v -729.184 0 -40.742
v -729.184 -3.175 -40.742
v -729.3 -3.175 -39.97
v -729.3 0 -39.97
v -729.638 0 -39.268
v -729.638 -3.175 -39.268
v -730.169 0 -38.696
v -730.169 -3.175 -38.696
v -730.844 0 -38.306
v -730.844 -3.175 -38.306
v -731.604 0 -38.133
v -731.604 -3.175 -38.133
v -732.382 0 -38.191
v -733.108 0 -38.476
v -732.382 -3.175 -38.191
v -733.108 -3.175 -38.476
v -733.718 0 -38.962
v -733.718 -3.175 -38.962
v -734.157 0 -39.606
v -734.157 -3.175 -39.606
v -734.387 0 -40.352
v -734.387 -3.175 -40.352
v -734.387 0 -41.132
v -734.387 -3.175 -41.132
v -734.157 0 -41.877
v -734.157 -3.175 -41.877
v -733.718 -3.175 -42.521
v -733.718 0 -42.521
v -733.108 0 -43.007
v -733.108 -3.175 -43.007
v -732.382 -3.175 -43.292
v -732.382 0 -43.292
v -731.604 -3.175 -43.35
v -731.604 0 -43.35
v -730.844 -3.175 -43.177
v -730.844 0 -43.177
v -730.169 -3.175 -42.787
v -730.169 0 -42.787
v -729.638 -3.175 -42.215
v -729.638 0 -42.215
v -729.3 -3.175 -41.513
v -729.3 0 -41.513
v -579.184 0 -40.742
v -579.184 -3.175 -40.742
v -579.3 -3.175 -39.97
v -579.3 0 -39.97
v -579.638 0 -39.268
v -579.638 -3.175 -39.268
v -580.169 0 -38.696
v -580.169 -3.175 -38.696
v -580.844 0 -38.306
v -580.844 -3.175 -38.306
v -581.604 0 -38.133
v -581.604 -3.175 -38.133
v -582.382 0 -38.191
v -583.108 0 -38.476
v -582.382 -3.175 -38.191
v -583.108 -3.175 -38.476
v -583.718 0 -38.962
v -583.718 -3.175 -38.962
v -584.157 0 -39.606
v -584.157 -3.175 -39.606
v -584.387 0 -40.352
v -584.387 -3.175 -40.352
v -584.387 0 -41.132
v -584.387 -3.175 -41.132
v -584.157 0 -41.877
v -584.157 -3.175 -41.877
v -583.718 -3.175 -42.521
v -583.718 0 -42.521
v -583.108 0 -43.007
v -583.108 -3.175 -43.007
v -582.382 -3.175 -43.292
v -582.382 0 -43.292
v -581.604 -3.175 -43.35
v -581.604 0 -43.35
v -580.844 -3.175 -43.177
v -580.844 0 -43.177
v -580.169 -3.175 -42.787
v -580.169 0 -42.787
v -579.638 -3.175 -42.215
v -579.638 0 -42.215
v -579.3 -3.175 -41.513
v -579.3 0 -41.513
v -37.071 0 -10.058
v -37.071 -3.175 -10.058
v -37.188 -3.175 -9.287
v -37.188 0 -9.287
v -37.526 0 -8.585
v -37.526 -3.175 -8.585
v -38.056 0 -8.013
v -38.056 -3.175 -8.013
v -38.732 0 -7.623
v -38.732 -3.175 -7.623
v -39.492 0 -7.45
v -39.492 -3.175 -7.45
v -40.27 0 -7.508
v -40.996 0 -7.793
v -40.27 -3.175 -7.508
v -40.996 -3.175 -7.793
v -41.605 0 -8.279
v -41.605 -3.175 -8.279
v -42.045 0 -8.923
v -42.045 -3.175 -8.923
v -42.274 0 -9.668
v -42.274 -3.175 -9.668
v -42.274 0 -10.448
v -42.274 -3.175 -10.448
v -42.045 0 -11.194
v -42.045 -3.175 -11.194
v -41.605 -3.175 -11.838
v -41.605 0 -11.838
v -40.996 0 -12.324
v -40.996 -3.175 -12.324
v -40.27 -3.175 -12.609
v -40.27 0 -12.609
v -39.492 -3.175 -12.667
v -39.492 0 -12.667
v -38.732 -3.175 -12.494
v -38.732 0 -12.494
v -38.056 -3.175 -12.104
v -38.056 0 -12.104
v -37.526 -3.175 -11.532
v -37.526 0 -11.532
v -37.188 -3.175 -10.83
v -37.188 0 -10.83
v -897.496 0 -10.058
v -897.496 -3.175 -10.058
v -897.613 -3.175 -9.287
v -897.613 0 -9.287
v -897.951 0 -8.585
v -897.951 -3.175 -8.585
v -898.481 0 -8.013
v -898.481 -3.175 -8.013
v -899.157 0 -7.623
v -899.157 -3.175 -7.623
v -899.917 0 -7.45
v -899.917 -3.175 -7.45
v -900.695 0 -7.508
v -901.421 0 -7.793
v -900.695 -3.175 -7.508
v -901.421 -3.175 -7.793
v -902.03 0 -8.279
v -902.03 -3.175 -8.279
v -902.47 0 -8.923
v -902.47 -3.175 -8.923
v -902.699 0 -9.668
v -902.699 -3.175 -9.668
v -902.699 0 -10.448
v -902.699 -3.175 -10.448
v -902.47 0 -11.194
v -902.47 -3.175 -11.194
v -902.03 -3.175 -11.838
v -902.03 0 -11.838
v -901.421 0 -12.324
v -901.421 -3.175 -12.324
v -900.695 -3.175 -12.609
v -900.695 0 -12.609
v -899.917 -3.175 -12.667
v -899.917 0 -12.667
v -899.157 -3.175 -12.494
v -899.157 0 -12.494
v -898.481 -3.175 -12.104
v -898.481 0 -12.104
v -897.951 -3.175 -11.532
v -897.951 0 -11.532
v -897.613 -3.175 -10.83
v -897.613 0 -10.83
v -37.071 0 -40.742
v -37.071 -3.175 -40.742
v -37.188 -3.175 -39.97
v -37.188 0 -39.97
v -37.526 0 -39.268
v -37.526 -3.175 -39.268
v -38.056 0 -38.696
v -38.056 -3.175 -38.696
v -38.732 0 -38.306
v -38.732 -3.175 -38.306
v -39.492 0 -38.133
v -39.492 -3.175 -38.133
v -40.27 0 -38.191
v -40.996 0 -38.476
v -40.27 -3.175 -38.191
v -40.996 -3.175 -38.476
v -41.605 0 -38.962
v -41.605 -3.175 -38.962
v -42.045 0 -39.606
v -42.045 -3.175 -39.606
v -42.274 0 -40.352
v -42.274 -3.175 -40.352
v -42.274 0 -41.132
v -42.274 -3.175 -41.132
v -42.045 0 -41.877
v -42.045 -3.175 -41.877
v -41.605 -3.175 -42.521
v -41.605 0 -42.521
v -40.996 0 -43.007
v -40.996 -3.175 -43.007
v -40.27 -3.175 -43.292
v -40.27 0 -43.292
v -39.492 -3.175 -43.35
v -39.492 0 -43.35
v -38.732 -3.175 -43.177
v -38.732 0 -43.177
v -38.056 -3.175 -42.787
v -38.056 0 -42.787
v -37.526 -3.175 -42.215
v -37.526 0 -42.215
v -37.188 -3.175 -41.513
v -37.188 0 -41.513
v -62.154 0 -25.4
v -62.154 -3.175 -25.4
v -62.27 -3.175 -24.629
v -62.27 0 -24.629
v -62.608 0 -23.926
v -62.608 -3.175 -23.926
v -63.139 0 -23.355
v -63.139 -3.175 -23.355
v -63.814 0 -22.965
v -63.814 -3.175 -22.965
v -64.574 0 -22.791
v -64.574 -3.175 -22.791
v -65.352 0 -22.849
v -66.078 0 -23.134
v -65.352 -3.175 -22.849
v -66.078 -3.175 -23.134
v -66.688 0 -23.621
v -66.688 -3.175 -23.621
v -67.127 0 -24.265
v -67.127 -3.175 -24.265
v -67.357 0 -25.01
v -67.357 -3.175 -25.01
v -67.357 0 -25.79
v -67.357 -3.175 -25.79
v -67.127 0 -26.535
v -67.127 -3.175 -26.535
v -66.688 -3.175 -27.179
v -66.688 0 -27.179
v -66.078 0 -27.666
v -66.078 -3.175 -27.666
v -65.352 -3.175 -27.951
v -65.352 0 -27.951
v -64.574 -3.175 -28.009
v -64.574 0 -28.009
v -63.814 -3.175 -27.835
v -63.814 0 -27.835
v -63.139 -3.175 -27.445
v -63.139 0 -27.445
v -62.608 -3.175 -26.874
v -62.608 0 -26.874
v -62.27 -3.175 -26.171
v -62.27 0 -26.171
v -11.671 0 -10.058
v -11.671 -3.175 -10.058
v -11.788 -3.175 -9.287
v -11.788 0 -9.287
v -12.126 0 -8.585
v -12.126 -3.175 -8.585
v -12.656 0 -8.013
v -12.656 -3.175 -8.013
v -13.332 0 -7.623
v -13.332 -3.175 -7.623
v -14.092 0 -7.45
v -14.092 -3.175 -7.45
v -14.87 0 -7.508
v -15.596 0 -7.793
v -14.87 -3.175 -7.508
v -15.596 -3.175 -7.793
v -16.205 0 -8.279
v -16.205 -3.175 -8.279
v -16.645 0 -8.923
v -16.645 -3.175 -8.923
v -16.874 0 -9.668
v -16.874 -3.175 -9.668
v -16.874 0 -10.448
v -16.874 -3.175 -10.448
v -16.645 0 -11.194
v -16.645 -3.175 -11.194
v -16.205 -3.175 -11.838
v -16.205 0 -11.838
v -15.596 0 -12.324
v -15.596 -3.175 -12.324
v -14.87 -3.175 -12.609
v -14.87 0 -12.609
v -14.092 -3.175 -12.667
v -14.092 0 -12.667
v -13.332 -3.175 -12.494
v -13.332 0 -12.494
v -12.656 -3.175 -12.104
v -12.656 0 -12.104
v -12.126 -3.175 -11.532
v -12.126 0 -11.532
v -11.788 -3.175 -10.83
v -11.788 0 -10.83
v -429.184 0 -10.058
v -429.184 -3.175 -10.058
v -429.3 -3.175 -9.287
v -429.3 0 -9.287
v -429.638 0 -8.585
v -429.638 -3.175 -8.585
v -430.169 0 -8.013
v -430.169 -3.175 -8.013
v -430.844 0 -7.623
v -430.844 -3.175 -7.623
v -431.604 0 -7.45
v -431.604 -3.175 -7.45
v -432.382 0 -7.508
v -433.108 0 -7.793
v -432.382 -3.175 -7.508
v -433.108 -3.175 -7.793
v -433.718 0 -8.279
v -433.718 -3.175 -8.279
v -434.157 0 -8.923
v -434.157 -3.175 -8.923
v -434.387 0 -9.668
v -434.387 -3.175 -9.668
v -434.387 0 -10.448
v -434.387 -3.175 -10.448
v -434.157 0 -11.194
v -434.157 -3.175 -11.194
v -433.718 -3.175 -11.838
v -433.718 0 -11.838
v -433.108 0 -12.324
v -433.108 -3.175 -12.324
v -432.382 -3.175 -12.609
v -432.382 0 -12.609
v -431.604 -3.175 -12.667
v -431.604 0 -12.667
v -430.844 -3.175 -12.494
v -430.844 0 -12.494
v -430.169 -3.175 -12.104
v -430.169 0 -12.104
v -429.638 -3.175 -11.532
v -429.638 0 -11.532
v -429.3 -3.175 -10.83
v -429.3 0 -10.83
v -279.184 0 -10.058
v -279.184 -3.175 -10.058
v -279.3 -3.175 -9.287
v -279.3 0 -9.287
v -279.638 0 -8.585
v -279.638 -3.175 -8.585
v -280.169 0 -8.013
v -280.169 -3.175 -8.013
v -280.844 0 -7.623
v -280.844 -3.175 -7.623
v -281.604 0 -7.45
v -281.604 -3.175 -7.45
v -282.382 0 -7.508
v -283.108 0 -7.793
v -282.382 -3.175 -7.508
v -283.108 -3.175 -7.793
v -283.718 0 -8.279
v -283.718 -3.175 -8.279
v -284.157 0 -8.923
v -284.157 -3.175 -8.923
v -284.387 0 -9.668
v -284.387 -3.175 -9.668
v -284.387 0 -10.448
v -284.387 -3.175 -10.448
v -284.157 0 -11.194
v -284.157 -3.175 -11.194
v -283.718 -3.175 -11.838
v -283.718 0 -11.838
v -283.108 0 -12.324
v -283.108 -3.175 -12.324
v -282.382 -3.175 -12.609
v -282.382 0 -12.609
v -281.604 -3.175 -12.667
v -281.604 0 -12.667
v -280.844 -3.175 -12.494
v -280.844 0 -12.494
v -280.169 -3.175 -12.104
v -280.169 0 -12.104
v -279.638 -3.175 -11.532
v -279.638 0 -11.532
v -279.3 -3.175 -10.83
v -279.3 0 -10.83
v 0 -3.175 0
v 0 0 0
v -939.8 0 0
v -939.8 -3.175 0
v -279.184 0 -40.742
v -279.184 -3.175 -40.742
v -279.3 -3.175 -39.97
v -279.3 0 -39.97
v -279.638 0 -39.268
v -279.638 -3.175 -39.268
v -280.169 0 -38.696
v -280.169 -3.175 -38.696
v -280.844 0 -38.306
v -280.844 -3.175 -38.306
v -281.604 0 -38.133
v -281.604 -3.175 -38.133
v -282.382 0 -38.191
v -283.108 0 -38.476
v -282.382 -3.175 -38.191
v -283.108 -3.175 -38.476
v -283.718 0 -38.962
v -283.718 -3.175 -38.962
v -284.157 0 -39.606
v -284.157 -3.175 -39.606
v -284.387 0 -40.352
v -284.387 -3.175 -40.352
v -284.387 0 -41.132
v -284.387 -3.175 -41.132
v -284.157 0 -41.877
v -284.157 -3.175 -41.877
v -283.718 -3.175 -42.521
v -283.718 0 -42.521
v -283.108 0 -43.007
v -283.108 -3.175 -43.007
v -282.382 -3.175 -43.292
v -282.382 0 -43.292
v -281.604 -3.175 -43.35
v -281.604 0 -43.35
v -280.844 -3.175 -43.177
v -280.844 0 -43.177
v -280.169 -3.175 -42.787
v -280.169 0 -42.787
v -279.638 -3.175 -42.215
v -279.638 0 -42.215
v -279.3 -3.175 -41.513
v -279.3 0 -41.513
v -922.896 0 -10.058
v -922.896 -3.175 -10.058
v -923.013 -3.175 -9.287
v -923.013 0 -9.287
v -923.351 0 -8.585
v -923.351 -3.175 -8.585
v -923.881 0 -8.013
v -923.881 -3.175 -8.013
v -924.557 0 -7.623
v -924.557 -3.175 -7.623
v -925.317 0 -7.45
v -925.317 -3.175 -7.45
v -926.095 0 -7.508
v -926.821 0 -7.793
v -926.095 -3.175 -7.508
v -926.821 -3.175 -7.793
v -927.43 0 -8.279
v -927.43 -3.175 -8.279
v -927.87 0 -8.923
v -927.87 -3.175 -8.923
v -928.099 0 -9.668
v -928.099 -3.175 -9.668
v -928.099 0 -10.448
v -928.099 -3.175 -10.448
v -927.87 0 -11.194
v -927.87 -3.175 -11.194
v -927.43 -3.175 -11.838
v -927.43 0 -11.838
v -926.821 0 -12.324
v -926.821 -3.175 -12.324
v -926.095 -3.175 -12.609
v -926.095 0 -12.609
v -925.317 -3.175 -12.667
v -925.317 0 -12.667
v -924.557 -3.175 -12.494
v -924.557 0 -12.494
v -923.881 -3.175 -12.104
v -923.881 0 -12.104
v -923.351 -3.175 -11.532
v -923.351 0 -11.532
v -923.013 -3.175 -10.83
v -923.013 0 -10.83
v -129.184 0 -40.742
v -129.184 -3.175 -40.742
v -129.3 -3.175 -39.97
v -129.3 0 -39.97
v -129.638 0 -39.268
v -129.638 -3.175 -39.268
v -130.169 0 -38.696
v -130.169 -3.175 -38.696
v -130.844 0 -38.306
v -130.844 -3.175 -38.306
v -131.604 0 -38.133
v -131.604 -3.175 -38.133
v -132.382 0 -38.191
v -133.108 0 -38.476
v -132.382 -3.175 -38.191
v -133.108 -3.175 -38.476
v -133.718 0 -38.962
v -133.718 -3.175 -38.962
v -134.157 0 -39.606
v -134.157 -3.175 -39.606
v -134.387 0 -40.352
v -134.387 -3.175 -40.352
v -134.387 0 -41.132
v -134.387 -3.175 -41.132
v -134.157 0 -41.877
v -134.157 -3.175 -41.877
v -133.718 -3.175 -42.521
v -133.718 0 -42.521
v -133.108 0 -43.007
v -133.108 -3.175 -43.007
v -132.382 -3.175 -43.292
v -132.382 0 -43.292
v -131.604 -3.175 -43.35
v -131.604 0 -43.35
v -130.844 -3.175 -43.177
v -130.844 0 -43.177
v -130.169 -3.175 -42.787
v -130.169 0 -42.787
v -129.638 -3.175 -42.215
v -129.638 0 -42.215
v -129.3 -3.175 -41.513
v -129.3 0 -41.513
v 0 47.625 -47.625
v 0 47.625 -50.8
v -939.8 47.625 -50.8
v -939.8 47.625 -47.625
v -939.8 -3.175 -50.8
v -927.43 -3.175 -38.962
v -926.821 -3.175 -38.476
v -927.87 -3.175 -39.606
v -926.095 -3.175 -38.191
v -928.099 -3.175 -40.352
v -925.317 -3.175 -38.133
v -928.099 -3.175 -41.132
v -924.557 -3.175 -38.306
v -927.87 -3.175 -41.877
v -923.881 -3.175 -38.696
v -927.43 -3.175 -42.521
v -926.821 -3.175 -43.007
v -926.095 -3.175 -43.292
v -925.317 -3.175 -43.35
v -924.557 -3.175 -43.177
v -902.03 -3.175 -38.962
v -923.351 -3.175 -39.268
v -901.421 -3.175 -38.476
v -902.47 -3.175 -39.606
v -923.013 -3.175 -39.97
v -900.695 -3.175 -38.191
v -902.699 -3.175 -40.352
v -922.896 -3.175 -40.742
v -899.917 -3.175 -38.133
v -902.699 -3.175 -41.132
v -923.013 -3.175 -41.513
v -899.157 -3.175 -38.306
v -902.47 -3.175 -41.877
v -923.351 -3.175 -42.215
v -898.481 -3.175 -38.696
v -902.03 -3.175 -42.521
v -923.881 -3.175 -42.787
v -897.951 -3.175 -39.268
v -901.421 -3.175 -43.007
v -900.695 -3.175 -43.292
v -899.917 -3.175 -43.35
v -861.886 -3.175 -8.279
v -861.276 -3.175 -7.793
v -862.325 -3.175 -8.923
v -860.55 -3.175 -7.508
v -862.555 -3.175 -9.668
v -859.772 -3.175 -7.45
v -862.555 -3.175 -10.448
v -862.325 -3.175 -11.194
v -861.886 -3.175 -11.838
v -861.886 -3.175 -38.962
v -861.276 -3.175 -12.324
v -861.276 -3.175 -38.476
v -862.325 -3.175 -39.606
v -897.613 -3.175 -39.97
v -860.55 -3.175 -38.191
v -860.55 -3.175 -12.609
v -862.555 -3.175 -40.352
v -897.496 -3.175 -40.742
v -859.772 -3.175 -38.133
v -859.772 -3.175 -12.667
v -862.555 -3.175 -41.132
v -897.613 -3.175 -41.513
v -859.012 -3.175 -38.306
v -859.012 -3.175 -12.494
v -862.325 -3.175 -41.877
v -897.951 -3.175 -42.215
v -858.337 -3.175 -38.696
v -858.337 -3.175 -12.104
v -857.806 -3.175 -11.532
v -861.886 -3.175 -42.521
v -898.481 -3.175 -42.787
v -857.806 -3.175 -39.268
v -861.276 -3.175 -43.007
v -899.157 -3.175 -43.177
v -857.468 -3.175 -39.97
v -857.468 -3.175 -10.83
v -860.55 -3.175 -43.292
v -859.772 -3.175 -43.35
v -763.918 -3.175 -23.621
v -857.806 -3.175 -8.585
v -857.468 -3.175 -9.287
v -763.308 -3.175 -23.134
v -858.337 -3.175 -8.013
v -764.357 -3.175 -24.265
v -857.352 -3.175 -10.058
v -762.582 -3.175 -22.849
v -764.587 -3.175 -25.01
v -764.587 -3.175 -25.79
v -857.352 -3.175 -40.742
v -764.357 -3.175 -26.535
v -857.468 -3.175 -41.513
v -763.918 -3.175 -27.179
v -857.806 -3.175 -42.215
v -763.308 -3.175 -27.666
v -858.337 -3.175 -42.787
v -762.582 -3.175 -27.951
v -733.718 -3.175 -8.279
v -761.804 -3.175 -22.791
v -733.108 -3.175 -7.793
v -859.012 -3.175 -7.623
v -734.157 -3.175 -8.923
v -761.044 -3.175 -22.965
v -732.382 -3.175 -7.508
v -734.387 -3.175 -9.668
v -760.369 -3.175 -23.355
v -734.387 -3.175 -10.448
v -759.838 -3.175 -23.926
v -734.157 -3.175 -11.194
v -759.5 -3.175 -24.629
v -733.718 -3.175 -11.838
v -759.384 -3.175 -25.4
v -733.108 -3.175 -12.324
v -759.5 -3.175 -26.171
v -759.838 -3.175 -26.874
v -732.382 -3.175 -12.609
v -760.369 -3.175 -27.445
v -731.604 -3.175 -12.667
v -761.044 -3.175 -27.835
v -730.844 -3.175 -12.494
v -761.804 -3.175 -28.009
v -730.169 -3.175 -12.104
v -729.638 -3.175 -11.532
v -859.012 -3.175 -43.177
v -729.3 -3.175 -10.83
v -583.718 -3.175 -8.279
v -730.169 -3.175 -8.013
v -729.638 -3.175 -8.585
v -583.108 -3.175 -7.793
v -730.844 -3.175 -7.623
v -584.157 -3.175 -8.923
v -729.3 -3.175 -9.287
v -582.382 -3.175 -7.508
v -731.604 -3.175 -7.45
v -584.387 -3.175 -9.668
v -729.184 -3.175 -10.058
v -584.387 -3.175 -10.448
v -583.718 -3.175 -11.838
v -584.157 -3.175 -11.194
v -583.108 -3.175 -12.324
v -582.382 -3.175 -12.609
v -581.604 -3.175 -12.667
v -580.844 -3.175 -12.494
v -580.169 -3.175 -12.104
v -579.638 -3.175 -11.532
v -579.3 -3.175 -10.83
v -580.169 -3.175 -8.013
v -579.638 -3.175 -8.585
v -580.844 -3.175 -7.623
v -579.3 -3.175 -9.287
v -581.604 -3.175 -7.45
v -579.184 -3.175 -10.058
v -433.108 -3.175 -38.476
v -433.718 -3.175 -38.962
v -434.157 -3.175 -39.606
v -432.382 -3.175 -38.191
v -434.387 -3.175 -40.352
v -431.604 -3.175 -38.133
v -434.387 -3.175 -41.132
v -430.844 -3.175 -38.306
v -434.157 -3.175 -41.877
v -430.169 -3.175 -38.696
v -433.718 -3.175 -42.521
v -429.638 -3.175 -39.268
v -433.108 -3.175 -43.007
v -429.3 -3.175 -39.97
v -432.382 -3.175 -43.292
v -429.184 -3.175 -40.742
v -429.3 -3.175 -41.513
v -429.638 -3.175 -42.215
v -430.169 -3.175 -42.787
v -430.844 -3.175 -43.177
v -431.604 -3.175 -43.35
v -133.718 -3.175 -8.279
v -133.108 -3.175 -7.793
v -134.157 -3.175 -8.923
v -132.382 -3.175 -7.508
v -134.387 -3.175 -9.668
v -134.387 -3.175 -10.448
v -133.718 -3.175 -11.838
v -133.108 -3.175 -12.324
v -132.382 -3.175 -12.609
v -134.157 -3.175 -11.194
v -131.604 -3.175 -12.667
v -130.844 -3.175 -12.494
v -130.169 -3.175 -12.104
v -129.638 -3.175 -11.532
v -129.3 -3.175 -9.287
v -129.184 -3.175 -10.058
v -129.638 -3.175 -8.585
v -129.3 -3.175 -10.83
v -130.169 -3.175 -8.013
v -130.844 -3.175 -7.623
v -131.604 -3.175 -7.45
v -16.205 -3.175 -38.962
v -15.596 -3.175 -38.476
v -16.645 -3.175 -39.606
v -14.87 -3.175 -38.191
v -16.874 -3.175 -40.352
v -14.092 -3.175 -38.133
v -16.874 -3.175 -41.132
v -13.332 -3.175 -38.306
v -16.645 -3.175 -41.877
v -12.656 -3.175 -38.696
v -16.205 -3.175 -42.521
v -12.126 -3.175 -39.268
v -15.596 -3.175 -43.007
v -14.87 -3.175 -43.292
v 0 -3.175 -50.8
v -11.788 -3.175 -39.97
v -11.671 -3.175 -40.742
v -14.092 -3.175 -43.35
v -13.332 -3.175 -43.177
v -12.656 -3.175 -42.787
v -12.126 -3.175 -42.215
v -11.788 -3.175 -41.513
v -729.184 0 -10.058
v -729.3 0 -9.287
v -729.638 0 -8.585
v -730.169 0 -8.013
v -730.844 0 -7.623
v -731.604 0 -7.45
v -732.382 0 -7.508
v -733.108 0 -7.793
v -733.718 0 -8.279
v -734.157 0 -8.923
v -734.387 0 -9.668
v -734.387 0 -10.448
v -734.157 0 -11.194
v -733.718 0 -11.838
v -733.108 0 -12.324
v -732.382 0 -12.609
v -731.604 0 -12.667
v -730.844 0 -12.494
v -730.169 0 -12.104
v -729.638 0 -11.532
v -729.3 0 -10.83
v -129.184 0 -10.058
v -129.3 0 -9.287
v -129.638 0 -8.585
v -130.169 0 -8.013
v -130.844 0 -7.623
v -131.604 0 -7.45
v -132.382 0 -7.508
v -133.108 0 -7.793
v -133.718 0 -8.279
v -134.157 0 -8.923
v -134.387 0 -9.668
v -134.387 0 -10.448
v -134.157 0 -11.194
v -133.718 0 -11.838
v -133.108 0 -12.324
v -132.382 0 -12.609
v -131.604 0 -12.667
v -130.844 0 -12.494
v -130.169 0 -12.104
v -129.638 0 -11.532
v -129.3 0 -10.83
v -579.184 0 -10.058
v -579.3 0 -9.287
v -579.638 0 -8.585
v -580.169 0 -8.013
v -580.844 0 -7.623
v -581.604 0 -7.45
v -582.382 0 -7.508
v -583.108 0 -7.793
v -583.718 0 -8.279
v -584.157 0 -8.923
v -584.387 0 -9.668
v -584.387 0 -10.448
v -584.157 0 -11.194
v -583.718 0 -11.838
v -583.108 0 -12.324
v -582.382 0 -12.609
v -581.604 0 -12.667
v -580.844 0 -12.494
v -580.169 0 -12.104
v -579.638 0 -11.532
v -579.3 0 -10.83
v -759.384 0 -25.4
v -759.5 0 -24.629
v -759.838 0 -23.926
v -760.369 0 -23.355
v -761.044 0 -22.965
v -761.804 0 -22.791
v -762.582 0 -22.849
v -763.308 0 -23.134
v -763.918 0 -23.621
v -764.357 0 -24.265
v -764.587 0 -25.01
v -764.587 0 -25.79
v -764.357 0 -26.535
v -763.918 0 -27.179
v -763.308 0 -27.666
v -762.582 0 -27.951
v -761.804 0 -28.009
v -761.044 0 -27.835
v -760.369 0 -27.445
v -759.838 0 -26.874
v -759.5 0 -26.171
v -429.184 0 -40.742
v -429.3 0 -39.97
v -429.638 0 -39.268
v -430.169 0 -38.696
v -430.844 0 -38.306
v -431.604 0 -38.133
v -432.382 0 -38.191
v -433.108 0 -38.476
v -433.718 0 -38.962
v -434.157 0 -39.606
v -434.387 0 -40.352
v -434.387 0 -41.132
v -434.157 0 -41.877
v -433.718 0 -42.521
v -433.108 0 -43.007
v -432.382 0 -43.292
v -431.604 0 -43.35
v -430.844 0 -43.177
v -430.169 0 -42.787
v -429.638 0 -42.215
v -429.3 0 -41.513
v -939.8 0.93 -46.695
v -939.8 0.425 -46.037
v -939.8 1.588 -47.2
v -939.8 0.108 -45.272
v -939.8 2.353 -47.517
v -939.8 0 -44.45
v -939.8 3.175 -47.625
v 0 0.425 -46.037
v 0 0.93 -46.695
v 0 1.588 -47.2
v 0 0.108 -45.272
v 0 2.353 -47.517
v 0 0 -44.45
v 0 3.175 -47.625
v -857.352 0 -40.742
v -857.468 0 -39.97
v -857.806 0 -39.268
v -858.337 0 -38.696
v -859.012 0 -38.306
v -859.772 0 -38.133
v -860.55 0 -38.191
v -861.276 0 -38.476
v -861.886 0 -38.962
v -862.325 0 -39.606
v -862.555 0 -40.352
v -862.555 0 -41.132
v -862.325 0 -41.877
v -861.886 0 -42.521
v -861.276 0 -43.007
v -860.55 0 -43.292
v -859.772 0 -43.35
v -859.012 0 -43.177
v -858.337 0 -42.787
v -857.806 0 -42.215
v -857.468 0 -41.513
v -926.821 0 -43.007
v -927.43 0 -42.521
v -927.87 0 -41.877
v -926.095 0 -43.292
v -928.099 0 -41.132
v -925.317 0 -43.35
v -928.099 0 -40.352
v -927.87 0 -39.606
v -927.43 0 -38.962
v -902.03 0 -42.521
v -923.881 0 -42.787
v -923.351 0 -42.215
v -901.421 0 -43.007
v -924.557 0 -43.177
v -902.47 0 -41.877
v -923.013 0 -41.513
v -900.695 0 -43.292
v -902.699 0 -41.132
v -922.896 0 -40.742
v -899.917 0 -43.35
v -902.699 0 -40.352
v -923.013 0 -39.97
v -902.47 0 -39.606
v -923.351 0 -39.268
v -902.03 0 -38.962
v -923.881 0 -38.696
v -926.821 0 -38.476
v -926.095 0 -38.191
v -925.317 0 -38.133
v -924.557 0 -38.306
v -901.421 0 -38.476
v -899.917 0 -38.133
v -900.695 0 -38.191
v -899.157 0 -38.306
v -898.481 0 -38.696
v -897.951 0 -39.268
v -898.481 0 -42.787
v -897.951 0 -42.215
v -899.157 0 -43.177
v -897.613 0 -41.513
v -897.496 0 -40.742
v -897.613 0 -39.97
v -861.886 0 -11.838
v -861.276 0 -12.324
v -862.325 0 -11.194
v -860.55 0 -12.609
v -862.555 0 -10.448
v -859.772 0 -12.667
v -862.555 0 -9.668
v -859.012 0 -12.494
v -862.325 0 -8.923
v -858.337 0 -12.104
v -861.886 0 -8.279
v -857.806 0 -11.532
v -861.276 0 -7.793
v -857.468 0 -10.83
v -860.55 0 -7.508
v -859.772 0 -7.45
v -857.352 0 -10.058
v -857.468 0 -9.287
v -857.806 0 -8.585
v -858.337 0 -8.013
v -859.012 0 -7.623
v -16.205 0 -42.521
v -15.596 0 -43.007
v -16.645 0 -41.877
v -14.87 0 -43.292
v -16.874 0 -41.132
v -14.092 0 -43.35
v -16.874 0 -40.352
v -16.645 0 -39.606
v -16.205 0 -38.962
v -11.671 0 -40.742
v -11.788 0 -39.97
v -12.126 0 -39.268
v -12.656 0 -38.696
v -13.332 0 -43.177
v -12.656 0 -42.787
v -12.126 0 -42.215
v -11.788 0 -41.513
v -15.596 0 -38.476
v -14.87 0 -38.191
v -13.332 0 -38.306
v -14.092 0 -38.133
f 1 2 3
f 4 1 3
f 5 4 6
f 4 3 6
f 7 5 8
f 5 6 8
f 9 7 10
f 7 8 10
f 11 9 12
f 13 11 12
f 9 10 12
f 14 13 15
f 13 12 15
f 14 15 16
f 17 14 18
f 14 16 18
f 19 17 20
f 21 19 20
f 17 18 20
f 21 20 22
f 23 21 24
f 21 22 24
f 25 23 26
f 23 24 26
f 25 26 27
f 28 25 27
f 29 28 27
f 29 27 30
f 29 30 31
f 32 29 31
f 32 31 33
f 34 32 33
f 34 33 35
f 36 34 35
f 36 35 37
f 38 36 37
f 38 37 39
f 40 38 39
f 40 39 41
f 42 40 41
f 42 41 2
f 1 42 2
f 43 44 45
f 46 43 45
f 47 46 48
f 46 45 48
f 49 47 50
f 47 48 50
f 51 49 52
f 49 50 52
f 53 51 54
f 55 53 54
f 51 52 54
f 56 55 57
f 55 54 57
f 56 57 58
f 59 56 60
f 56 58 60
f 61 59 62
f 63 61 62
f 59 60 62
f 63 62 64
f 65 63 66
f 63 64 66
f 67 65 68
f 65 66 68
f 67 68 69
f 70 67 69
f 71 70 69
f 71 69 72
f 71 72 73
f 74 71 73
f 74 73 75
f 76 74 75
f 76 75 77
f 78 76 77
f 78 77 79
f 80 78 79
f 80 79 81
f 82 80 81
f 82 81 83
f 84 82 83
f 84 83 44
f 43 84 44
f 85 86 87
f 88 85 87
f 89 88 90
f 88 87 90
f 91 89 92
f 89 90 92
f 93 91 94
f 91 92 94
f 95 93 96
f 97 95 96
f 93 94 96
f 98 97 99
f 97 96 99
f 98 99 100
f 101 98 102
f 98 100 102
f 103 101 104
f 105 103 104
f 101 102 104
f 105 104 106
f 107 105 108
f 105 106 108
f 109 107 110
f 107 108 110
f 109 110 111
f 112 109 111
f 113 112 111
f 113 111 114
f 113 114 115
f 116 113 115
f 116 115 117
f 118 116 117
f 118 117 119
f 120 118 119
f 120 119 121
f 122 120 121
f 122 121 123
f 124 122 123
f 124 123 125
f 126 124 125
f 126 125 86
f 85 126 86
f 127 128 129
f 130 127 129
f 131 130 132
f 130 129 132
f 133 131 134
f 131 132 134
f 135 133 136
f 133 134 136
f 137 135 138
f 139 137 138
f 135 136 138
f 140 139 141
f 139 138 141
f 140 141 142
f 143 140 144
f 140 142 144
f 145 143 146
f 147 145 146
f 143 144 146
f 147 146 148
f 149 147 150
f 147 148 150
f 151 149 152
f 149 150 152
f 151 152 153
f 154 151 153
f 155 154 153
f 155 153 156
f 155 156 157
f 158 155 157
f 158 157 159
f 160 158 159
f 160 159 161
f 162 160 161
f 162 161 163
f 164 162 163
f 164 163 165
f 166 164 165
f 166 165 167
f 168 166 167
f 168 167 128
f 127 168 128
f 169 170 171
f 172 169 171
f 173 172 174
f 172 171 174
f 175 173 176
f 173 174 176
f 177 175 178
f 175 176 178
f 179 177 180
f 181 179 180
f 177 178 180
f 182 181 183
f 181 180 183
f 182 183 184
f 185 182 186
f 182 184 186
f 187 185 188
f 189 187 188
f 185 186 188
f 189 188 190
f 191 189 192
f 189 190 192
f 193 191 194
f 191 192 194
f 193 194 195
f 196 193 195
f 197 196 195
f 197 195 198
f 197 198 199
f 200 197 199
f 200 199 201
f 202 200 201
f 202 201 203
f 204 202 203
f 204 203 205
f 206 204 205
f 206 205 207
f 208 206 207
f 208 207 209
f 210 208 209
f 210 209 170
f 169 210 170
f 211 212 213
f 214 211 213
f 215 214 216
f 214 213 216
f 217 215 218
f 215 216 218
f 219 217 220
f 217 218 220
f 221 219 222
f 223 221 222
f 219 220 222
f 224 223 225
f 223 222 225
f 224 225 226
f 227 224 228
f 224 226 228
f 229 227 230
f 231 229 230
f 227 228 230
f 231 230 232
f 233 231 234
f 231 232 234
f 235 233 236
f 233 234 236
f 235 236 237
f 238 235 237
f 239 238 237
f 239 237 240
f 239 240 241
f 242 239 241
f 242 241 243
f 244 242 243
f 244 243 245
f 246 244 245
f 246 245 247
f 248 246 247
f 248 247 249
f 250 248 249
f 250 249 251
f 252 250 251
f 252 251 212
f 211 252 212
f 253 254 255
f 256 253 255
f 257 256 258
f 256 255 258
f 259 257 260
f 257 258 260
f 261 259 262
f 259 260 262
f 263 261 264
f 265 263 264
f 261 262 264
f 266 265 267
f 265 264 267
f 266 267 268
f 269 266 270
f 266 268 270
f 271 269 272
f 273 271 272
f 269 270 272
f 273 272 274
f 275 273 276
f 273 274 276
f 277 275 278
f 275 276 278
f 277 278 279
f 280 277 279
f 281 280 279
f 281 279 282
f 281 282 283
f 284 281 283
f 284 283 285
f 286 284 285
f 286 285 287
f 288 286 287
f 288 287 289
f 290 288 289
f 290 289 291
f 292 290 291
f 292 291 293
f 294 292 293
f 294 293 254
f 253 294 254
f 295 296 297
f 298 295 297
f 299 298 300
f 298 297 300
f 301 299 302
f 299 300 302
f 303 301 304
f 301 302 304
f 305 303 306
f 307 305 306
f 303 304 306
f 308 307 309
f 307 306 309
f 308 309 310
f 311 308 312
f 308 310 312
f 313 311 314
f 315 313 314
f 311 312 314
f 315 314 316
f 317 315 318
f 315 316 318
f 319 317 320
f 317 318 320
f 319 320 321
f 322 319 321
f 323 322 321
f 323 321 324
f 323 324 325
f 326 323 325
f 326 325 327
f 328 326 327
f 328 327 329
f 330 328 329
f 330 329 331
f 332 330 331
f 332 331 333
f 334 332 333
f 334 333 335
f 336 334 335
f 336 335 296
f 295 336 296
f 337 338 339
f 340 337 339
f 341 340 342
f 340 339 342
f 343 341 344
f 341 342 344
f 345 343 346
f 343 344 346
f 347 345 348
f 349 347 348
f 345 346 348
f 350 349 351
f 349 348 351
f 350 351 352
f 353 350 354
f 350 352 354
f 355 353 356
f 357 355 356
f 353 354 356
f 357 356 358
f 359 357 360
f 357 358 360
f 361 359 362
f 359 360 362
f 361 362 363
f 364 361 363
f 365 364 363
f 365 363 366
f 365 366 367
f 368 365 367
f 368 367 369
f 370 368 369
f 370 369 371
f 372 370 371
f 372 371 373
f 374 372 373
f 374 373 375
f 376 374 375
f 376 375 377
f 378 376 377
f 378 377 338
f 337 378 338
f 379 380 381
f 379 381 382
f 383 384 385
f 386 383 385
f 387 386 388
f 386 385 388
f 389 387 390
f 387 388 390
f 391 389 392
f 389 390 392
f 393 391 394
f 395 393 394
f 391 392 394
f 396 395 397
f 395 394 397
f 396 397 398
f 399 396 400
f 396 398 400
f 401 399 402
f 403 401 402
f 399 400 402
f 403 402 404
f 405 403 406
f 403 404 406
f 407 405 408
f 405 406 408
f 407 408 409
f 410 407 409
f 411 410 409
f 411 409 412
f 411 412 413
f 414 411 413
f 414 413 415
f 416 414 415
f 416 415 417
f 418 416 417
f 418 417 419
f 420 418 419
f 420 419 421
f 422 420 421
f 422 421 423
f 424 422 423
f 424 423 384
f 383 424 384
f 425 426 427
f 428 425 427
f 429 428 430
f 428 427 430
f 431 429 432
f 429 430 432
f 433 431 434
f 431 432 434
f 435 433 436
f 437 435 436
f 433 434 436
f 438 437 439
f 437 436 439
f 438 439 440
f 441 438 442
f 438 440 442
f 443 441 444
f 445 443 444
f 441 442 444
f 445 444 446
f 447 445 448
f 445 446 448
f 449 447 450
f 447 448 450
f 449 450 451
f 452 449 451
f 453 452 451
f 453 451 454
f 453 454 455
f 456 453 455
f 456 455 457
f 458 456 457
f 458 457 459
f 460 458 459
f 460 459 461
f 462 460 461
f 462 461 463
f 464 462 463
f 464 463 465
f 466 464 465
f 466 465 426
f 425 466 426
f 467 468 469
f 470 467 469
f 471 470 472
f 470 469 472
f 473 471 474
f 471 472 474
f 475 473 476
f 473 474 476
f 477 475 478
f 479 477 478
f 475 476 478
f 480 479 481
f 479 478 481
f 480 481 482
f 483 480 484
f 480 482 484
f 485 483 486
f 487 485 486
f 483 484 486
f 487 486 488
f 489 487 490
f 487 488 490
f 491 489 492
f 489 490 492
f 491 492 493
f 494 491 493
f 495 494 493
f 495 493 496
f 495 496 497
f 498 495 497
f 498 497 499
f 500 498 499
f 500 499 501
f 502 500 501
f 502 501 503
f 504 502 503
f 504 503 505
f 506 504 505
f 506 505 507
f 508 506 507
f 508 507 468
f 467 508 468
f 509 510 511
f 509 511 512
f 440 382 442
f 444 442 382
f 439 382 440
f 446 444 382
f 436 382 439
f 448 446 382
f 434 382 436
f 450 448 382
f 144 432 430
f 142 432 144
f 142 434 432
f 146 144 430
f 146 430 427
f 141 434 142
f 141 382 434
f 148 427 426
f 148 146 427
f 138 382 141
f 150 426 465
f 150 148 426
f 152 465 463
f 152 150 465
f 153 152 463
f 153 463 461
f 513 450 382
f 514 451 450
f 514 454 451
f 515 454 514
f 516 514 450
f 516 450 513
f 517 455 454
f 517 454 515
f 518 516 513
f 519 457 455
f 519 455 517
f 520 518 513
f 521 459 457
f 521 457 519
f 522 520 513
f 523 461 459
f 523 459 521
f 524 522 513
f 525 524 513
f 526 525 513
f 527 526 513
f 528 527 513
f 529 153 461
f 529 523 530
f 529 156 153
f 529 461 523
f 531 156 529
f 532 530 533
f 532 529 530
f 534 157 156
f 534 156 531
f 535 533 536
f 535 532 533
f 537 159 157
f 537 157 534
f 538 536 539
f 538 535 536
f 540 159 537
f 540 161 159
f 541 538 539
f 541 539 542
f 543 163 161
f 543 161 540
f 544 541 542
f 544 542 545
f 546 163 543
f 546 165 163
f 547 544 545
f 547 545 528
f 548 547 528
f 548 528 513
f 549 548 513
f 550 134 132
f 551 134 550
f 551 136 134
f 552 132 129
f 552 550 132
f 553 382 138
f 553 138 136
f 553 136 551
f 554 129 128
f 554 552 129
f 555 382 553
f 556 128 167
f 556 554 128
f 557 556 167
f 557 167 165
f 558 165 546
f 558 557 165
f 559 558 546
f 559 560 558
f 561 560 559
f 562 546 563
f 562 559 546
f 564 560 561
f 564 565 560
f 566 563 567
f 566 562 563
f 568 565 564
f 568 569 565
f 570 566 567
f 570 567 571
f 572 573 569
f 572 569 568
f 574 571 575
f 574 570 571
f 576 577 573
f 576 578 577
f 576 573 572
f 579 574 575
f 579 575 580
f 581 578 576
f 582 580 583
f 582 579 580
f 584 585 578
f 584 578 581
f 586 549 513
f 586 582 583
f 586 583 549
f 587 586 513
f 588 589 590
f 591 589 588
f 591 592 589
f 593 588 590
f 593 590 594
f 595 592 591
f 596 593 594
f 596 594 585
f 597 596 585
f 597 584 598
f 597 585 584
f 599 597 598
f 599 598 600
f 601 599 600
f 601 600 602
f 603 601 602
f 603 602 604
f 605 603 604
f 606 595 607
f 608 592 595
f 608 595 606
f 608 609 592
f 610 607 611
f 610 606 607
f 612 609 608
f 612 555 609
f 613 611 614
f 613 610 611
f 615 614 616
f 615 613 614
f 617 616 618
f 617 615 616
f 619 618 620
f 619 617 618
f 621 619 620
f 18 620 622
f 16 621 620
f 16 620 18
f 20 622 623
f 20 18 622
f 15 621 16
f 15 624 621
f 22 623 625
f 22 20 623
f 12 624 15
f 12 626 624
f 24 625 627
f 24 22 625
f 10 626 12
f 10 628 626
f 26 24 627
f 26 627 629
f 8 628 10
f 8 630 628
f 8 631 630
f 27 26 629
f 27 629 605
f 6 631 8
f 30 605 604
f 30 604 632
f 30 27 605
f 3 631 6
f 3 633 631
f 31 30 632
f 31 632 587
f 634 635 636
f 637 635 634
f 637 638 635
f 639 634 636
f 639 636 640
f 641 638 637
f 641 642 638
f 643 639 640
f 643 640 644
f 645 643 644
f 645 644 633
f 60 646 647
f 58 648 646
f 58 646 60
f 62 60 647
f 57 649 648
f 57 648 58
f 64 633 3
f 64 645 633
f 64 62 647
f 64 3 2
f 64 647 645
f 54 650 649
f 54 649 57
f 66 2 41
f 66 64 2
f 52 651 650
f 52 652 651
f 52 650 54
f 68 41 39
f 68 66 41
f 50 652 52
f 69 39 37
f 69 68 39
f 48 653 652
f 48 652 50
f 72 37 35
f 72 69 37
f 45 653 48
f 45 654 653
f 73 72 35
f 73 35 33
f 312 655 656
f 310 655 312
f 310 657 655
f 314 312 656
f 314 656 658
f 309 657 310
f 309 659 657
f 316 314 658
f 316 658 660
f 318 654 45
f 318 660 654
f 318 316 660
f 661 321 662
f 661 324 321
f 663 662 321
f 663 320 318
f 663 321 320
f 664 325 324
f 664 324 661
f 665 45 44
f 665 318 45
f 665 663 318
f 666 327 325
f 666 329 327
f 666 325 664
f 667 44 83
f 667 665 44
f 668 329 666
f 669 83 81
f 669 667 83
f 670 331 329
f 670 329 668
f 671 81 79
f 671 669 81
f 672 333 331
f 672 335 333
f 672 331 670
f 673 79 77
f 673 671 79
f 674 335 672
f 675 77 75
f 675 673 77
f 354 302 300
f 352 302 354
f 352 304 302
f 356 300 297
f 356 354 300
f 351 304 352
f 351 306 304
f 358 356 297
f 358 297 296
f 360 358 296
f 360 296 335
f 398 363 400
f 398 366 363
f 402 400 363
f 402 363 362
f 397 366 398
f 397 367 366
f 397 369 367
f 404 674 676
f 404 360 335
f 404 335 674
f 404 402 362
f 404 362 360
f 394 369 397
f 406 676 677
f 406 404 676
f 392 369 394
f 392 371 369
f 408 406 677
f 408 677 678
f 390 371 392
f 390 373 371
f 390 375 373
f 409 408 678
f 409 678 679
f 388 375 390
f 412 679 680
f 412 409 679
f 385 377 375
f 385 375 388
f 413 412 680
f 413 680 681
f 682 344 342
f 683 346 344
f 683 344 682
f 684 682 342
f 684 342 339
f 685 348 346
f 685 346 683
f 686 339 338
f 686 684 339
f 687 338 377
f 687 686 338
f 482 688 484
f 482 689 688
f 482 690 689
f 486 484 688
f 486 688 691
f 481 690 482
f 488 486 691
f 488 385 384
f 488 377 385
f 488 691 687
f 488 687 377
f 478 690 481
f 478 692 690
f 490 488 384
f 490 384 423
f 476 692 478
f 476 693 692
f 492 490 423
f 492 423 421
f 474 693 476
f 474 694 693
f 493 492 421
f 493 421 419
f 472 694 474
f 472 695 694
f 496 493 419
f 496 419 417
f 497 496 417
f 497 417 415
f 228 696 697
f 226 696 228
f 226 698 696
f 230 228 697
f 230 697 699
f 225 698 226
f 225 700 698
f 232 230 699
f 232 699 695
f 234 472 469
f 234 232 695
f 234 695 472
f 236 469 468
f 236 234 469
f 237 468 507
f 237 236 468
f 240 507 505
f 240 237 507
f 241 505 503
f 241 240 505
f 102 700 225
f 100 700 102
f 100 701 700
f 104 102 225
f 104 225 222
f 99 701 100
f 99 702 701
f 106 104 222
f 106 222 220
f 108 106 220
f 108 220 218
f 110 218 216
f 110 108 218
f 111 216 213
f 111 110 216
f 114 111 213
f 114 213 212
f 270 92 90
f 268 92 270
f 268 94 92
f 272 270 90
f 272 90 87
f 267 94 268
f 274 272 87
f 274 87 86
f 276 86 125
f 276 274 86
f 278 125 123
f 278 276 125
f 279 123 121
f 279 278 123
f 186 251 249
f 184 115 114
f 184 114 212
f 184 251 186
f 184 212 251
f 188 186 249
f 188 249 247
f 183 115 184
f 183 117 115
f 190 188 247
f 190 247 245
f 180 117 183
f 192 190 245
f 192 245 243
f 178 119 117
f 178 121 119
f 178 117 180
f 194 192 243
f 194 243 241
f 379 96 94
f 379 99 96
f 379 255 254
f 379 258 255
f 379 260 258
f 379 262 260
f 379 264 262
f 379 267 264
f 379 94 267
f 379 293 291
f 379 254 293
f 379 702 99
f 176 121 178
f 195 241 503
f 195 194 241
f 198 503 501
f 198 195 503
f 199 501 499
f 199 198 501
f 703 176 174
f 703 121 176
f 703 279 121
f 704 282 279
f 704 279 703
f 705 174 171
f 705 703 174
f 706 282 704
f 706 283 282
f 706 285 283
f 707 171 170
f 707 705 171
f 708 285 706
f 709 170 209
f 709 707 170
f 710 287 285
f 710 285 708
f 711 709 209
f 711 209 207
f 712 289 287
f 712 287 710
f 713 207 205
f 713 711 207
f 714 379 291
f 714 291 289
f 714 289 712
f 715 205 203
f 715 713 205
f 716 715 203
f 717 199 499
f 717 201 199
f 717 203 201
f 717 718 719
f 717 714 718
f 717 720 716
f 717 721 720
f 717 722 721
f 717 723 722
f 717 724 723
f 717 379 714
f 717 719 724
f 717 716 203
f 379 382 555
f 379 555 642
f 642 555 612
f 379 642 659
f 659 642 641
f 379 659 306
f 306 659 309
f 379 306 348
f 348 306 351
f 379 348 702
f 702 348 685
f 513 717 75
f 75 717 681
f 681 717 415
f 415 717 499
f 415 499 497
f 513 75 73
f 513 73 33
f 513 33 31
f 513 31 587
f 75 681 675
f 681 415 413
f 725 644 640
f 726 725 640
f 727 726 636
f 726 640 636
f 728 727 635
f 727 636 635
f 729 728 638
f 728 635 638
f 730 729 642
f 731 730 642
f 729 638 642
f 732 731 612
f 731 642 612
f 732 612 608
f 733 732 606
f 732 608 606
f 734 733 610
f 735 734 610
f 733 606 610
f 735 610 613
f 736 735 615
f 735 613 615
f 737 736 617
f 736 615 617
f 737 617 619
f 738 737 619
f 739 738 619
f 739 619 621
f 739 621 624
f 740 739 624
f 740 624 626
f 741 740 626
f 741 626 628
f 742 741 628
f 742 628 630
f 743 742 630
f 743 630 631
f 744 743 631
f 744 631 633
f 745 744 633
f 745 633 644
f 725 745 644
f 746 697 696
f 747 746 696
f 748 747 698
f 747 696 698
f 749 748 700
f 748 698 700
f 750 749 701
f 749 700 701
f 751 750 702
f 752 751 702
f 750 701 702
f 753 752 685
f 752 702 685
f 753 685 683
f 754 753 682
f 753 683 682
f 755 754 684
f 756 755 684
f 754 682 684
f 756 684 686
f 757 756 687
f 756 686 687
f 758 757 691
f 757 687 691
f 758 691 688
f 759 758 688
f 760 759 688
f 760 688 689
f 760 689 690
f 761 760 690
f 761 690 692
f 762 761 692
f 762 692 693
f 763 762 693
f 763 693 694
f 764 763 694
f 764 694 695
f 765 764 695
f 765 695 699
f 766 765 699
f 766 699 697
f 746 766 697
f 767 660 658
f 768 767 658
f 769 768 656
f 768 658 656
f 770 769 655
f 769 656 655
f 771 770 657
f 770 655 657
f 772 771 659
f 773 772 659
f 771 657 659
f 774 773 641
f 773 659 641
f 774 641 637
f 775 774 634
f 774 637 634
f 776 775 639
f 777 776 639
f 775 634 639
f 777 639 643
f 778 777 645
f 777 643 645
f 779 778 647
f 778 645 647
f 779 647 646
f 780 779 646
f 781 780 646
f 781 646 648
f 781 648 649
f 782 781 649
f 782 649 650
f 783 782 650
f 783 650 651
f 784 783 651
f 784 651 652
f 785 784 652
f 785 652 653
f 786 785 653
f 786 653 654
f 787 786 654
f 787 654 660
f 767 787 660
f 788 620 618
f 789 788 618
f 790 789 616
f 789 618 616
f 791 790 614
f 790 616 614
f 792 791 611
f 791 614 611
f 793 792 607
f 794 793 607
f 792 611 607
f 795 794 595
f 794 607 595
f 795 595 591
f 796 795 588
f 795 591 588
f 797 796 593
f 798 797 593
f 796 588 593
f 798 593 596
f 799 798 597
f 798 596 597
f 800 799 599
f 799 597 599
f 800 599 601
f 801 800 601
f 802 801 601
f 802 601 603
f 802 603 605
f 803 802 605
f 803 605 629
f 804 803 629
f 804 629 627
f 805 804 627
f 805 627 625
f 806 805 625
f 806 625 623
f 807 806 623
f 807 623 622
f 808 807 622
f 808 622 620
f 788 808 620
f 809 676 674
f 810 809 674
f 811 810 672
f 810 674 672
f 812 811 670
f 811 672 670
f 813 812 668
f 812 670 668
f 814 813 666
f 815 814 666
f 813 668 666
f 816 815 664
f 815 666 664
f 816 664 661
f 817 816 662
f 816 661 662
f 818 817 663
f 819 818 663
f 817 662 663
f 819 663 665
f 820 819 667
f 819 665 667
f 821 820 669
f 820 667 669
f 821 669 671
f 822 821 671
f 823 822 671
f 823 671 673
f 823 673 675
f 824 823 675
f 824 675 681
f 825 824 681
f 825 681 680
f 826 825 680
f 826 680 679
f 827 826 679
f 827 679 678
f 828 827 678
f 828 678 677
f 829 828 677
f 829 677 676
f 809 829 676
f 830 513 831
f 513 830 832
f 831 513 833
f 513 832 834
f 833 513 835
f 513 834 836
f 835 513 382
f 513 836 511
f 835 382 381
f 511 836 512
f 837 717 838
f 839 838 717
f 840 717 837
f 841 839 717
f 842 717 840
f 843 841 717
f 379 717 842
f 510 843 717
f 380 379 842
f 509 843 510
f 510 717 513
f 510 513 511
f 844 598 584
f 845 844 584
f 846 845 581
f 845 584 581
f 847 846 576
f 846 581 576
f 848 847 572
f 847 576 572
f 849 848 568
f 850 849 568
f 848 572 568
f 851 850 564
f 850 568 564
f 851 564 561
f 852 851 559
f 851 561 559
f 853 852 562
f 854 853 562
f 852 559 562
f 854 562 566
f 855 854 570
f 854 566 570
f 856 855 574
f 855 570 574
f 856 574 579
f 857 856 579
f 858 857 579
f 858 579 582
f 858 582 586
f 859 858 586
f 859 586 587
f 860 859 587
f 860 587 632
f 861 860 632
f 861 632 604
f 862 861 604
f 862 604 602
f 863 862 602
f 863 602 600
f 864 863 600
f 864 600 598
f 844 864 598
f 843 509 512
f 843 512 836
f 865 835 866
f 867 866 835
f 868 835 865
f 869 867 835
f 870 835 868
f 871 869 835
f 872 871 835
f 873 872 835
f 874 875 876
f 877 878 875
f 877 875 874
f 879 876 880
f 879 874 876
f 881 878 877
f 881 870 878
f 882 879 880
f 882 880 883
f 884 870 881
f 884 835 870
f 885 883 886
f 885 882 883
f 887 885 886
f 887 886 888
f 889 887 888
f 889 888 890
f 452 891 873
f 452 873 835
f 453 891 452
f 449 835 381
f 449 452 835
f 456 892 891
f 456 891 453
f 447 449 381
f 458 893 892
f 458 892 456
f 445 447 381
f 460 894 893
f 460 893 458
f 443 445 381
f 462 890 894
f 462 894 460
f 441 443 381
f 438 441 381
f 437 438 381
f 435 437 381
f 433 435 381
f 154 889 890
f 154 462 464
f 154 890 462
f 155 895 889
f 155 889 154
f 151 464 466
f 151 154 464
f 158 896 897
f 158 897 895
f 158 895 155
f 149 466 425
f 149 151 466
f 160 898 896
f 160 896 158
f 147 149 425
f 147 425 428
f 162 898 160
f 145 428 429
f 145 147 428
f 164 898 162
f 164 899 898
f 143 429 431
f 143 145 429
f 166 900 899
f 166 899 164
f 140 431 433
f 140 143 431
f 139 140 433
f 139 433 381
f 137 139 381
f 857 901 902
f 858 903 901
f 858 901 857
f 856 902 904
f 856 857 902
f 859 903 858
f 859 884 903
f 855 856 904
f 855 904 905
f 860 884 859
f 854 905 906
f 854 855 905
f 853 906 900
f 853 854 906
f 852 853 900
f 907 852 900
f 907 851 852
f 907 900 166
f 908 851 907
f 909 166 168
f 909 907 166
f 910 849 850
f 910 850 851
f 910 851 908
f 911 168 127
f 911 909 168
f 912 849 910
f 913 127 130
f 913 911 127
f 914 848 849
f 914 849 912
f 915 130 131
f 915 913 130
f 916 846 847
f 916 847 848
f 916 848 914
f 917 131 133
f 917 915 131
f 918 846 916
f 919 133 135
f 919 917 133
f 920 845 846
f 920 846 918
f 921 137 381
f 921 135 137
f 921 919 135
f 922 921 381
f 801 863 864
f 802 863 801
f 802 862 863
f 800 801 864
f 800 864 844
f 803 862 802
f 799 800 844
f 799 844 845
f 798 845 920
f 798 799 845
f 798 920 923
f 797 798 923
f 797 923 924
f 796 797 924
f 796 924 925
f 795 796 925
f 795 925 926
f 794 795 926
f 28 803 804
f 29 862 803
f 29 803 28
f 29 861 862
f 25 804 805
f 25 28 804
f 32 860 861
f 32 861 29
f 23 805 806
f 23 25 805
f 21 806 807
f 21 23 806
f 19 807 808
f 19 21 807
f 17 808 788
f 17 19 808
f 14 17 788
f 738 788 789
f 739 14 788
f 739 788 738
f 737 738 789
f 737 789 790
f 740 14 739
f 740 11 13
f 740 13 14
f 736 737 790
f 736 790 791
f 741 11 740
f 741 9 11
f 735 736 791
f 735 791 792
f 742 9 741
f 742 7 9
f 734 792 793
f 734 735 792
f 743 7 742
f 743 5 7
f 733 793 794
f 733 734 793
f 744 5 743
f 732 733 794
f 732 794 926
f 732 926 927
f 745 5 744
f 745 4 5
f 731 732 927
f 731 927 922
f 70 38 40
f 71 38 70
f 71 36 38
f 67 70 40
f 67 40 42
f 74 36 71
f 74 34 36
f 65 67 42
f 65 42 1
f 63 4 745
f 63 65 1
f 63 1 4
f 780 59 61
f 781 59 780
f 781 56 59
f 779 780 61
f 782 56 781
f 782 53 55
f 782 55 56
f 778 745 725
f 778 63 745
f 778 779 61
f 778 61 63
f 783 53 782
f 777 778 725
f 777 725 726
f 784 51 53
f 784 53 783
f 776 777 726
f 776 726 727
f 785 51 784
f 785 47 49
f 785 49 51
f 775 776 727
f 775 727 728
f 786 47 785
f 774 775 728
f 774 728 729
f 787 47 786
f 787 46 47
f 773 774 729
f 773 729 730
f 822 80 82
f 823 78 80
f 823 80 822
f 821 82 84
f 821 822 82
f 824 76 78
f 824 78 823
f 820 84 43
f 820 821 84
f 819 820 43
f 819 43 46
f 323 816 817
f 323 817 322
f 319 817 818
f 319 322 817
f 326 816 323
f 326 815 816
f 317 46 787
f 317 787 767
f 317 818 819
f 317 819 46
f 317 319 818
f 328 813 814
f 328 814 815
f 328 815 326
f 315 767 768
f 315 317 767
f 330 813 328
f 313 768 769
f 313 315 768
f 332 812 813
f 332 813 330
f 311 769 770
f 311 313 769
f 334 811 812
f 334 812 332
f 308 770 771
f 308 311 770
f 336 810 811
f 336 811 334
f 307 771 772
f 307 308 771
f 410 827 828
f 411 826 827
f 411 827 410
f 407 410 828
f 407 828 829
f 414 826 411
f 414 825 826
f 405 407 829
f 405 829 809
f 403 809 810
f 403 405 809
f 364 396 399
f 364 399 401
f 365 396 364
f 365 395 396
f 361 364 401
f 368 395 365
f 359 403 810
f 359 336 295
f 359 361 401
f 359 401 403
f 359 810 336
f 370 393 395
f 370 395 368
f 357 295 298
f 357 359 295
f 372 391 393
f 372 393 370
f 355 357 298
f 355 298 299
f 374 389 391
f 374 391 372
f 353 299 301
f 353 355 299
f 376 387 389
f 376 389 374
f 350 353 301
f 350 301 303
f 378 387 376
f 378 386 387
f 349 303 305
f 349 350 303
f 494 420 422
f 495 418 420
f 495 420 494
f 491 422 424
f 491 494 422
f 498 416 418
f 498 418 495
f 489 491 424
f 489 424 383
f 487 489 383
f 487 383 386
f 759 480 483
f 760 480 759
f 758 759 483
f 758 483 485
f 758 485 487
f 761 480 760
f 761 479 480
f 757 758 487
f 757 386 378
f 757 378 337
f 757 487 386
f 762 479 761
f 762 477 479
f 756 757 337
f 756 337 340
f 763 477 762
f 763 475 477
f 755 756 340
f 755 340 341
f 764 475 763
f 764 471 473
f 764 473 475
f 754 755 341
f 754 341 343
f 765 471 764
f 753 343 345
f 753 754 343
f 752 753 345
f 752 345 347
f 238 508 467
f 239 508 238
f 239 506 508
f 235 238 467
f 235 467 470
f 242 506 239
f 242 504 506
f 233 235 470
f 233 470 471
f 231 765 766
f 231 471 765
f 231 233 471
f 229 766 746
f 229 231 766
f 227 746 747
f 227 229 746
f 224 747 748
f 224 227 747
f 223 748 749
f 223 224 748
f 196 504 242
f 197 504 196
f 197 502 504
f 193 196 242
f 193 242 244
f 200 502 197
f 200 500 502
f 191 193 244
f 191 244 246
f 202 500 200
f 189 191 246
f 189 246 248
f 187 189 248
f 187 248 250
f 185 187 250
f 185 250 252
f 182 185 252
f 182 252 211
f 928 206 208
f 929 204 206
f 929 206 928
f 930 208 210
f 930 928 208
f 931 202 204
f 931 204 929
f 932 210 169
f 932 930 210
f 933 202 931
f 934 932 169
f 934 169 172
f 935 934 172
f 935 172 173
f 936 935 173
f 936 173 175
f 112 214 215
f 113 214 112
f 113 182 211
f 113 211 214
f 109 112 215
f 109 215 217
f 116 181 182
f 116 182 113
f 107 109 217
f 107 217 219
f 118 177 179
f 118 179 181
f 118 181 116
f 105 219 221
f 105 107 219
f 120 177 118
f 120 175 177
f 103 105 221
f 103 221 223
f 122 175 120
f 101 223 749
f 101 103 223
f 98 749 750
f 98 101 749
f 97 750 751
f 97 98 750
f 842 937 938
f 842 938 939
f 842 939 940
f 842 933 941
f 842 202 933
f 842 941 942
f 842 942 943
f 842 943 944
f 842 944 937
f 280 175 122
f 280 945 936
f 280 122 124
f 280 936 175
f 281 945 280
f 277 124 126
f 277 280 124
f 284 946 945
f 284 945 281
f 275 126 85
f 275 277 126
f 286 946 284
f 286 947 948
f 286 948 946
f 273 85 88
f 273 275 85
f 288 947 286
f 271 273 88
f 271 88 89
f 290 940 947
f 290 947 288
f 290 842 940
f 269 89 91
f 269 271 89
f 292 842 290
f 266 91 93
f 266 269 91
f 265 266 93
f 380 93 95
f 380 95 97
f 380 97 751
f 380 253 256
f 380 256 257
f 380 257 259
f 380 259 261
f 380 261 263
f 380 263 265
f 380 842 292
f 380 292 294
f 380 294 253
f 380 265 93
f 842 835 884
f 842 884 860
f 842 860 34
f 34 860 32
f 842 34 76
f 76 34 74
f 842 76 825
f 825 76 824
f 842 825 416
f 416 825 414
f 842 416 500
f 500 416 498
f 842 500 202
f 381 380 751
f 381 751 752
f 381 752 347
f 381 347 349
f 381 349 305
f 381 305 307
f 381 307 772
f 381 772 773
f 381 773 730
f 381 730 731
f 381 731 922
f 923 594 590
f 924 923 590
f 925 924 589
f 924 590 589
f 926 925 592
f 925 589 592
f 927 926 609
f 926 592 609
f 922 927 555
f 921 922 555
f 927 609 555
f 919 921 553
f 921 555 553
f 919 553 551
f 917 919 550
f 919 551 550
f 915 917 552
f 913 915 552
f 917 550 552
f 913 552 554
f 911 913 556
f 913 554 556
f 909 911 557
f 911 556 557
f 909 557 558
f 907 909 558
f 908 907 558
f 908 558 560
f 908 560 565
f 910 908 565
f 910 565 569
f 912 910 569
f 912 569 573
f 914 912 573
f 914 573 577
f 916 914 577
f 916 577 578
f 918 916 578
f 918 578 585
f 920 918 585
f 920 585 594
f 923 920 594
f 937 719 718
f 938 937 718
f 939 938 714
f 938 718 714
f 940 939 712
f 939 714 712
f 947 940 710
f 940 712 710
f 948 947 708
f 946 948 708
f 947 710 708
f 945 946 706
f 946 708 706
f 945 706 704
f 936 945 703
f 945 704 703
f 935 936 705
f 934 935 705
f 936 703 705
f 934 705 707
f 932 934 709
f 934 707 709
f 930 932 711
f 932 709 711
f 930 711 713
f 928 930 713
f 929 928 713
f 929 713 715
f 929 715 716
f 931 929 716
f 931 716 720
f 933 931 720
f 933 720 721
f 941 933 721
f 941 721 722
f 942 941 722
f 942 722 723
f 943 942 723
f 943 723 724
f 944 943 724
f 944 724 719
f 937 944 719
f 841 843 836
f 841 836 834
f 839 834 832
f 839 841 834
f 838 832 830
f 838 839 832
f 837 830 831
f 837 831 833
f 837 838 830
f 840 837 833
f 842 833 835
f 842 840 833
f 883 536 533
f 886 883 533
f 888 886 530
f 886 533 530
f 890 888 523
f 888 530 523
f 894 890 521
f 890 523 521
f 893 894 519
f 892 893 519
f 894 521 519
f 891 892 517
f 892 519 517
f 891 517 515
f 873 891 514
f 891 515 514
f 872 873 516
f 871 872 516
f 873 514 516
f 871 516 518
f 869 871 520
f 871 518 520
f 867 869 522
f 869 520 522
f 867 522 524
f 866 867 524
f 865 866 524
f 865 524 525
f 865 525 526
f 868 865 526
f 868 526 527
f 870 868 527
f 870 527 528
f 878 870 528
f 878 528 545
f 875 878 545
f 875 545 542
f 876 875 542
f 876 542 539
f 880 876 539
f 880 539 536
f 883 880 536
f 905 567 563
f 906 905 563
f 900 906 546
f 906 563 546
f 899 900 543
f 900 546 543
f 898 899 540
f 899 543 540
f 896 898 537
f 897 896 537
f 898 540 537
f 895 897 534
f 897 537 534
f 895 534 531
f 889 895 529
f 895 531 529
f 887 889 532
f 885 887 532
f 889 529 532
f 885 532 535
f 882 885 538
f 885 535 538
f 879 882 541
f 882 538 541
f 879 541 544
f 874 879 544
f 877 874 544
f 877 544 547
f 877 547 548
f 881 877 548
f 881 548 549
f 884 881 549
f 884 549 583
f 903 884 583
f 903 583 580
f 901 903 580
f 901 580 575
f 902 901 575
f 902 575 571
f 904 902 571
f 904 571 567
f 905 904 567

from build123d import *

# Parameters (mm, degrees)
F1_DEPTH = 939.8
F2_R     = 2.6162
F3_DEPTH = 50.801


with BuildPart() as f1:
    # F0 (on Right) → F1 (new body)
    with BuildSketch(Plane.YZ):
        with BuildLine():
            Line((0, -44.45), (0, 0))
            Line((0, 0), (-3.175, 0))
            Line((-3.175, 0), (-3.175, -50.8))
            Line((-3.175, -50.8), (47.625, -50.8))
            Line((47.625, -50.8), (47.625, -47.625))
            Line((47.625, -47.625), (3.175, -47.625))
            ThreePointArc((3.175, -47.625), (0.929936, -46.695064), (0, -44.45))
        make_face()
    extrude(amount=-F1_DEPTH)

    # F2 (on face) → F3 (cut, through all)
    with BuildSketch(Plane.XZ.offset(3.175)):
        with Locations((-14.2875, -40.7416)):
            Circle(F2_R)
        with Locations((-14.2875, -10.0584)):
            Circle(F2_R)
        with Locations((-925.5125, -40.7416)):
            Circle(F2_R)
        with Locations((-925.5125, -10.0584)):
            Circle(F2_R)
        with Locations((-431.8, -10.0584)):
            Circle(F2_R)
        with Locations((-431.8, -40.7416)):
            Circle(F2_R)
        with Locations((-64.77, -25.4)):
            Circle(F2_R)
        with Locations((-762, -25.4)):
            Circle(F2_R)
        with Locations((-900.1125, -10.0584)):
            Circle(F2_R)
        with Locations((-900.1125, -40.7416)):
            Circle(F2_R)
        with Locations((-39.6875, -10.0584)):
            Circle(F2_R)
        with Locations((-39.6875, -40.7416)):
            Circle(F2_R)
        with Locations((-859.9678, -10.0584)):
            Circle(F2_R)
        with Locations((-859.9678, -40.7416)):
            Circle(F2_R)
        with Locations((-731.8, -10.0584)):
            Circle(F2_R)
        with Locations((-731.8, -40.7416)):
            Circle(F2_R)
        with Locations((-581.8, -10.0584)):
            Circle(F2_R)
        with Locations((-581.8, -40.7416)):
            Circle(F2_R)
        with Locations((-281.8, -10.0584)):
            Circle(F2_R)
        with Locations((-281.8, -40.7416)):
            Circle(F2_R)
        with Locations((-131.8, -10.0584)):
            Circle(F2_R)
        with Locations((-131.8, -40.7416)):
            Circle(F2_R)
    extrude(amount=-F3_DEPTH, mode=Mode.SUBTRACT)


solid = f1.part
